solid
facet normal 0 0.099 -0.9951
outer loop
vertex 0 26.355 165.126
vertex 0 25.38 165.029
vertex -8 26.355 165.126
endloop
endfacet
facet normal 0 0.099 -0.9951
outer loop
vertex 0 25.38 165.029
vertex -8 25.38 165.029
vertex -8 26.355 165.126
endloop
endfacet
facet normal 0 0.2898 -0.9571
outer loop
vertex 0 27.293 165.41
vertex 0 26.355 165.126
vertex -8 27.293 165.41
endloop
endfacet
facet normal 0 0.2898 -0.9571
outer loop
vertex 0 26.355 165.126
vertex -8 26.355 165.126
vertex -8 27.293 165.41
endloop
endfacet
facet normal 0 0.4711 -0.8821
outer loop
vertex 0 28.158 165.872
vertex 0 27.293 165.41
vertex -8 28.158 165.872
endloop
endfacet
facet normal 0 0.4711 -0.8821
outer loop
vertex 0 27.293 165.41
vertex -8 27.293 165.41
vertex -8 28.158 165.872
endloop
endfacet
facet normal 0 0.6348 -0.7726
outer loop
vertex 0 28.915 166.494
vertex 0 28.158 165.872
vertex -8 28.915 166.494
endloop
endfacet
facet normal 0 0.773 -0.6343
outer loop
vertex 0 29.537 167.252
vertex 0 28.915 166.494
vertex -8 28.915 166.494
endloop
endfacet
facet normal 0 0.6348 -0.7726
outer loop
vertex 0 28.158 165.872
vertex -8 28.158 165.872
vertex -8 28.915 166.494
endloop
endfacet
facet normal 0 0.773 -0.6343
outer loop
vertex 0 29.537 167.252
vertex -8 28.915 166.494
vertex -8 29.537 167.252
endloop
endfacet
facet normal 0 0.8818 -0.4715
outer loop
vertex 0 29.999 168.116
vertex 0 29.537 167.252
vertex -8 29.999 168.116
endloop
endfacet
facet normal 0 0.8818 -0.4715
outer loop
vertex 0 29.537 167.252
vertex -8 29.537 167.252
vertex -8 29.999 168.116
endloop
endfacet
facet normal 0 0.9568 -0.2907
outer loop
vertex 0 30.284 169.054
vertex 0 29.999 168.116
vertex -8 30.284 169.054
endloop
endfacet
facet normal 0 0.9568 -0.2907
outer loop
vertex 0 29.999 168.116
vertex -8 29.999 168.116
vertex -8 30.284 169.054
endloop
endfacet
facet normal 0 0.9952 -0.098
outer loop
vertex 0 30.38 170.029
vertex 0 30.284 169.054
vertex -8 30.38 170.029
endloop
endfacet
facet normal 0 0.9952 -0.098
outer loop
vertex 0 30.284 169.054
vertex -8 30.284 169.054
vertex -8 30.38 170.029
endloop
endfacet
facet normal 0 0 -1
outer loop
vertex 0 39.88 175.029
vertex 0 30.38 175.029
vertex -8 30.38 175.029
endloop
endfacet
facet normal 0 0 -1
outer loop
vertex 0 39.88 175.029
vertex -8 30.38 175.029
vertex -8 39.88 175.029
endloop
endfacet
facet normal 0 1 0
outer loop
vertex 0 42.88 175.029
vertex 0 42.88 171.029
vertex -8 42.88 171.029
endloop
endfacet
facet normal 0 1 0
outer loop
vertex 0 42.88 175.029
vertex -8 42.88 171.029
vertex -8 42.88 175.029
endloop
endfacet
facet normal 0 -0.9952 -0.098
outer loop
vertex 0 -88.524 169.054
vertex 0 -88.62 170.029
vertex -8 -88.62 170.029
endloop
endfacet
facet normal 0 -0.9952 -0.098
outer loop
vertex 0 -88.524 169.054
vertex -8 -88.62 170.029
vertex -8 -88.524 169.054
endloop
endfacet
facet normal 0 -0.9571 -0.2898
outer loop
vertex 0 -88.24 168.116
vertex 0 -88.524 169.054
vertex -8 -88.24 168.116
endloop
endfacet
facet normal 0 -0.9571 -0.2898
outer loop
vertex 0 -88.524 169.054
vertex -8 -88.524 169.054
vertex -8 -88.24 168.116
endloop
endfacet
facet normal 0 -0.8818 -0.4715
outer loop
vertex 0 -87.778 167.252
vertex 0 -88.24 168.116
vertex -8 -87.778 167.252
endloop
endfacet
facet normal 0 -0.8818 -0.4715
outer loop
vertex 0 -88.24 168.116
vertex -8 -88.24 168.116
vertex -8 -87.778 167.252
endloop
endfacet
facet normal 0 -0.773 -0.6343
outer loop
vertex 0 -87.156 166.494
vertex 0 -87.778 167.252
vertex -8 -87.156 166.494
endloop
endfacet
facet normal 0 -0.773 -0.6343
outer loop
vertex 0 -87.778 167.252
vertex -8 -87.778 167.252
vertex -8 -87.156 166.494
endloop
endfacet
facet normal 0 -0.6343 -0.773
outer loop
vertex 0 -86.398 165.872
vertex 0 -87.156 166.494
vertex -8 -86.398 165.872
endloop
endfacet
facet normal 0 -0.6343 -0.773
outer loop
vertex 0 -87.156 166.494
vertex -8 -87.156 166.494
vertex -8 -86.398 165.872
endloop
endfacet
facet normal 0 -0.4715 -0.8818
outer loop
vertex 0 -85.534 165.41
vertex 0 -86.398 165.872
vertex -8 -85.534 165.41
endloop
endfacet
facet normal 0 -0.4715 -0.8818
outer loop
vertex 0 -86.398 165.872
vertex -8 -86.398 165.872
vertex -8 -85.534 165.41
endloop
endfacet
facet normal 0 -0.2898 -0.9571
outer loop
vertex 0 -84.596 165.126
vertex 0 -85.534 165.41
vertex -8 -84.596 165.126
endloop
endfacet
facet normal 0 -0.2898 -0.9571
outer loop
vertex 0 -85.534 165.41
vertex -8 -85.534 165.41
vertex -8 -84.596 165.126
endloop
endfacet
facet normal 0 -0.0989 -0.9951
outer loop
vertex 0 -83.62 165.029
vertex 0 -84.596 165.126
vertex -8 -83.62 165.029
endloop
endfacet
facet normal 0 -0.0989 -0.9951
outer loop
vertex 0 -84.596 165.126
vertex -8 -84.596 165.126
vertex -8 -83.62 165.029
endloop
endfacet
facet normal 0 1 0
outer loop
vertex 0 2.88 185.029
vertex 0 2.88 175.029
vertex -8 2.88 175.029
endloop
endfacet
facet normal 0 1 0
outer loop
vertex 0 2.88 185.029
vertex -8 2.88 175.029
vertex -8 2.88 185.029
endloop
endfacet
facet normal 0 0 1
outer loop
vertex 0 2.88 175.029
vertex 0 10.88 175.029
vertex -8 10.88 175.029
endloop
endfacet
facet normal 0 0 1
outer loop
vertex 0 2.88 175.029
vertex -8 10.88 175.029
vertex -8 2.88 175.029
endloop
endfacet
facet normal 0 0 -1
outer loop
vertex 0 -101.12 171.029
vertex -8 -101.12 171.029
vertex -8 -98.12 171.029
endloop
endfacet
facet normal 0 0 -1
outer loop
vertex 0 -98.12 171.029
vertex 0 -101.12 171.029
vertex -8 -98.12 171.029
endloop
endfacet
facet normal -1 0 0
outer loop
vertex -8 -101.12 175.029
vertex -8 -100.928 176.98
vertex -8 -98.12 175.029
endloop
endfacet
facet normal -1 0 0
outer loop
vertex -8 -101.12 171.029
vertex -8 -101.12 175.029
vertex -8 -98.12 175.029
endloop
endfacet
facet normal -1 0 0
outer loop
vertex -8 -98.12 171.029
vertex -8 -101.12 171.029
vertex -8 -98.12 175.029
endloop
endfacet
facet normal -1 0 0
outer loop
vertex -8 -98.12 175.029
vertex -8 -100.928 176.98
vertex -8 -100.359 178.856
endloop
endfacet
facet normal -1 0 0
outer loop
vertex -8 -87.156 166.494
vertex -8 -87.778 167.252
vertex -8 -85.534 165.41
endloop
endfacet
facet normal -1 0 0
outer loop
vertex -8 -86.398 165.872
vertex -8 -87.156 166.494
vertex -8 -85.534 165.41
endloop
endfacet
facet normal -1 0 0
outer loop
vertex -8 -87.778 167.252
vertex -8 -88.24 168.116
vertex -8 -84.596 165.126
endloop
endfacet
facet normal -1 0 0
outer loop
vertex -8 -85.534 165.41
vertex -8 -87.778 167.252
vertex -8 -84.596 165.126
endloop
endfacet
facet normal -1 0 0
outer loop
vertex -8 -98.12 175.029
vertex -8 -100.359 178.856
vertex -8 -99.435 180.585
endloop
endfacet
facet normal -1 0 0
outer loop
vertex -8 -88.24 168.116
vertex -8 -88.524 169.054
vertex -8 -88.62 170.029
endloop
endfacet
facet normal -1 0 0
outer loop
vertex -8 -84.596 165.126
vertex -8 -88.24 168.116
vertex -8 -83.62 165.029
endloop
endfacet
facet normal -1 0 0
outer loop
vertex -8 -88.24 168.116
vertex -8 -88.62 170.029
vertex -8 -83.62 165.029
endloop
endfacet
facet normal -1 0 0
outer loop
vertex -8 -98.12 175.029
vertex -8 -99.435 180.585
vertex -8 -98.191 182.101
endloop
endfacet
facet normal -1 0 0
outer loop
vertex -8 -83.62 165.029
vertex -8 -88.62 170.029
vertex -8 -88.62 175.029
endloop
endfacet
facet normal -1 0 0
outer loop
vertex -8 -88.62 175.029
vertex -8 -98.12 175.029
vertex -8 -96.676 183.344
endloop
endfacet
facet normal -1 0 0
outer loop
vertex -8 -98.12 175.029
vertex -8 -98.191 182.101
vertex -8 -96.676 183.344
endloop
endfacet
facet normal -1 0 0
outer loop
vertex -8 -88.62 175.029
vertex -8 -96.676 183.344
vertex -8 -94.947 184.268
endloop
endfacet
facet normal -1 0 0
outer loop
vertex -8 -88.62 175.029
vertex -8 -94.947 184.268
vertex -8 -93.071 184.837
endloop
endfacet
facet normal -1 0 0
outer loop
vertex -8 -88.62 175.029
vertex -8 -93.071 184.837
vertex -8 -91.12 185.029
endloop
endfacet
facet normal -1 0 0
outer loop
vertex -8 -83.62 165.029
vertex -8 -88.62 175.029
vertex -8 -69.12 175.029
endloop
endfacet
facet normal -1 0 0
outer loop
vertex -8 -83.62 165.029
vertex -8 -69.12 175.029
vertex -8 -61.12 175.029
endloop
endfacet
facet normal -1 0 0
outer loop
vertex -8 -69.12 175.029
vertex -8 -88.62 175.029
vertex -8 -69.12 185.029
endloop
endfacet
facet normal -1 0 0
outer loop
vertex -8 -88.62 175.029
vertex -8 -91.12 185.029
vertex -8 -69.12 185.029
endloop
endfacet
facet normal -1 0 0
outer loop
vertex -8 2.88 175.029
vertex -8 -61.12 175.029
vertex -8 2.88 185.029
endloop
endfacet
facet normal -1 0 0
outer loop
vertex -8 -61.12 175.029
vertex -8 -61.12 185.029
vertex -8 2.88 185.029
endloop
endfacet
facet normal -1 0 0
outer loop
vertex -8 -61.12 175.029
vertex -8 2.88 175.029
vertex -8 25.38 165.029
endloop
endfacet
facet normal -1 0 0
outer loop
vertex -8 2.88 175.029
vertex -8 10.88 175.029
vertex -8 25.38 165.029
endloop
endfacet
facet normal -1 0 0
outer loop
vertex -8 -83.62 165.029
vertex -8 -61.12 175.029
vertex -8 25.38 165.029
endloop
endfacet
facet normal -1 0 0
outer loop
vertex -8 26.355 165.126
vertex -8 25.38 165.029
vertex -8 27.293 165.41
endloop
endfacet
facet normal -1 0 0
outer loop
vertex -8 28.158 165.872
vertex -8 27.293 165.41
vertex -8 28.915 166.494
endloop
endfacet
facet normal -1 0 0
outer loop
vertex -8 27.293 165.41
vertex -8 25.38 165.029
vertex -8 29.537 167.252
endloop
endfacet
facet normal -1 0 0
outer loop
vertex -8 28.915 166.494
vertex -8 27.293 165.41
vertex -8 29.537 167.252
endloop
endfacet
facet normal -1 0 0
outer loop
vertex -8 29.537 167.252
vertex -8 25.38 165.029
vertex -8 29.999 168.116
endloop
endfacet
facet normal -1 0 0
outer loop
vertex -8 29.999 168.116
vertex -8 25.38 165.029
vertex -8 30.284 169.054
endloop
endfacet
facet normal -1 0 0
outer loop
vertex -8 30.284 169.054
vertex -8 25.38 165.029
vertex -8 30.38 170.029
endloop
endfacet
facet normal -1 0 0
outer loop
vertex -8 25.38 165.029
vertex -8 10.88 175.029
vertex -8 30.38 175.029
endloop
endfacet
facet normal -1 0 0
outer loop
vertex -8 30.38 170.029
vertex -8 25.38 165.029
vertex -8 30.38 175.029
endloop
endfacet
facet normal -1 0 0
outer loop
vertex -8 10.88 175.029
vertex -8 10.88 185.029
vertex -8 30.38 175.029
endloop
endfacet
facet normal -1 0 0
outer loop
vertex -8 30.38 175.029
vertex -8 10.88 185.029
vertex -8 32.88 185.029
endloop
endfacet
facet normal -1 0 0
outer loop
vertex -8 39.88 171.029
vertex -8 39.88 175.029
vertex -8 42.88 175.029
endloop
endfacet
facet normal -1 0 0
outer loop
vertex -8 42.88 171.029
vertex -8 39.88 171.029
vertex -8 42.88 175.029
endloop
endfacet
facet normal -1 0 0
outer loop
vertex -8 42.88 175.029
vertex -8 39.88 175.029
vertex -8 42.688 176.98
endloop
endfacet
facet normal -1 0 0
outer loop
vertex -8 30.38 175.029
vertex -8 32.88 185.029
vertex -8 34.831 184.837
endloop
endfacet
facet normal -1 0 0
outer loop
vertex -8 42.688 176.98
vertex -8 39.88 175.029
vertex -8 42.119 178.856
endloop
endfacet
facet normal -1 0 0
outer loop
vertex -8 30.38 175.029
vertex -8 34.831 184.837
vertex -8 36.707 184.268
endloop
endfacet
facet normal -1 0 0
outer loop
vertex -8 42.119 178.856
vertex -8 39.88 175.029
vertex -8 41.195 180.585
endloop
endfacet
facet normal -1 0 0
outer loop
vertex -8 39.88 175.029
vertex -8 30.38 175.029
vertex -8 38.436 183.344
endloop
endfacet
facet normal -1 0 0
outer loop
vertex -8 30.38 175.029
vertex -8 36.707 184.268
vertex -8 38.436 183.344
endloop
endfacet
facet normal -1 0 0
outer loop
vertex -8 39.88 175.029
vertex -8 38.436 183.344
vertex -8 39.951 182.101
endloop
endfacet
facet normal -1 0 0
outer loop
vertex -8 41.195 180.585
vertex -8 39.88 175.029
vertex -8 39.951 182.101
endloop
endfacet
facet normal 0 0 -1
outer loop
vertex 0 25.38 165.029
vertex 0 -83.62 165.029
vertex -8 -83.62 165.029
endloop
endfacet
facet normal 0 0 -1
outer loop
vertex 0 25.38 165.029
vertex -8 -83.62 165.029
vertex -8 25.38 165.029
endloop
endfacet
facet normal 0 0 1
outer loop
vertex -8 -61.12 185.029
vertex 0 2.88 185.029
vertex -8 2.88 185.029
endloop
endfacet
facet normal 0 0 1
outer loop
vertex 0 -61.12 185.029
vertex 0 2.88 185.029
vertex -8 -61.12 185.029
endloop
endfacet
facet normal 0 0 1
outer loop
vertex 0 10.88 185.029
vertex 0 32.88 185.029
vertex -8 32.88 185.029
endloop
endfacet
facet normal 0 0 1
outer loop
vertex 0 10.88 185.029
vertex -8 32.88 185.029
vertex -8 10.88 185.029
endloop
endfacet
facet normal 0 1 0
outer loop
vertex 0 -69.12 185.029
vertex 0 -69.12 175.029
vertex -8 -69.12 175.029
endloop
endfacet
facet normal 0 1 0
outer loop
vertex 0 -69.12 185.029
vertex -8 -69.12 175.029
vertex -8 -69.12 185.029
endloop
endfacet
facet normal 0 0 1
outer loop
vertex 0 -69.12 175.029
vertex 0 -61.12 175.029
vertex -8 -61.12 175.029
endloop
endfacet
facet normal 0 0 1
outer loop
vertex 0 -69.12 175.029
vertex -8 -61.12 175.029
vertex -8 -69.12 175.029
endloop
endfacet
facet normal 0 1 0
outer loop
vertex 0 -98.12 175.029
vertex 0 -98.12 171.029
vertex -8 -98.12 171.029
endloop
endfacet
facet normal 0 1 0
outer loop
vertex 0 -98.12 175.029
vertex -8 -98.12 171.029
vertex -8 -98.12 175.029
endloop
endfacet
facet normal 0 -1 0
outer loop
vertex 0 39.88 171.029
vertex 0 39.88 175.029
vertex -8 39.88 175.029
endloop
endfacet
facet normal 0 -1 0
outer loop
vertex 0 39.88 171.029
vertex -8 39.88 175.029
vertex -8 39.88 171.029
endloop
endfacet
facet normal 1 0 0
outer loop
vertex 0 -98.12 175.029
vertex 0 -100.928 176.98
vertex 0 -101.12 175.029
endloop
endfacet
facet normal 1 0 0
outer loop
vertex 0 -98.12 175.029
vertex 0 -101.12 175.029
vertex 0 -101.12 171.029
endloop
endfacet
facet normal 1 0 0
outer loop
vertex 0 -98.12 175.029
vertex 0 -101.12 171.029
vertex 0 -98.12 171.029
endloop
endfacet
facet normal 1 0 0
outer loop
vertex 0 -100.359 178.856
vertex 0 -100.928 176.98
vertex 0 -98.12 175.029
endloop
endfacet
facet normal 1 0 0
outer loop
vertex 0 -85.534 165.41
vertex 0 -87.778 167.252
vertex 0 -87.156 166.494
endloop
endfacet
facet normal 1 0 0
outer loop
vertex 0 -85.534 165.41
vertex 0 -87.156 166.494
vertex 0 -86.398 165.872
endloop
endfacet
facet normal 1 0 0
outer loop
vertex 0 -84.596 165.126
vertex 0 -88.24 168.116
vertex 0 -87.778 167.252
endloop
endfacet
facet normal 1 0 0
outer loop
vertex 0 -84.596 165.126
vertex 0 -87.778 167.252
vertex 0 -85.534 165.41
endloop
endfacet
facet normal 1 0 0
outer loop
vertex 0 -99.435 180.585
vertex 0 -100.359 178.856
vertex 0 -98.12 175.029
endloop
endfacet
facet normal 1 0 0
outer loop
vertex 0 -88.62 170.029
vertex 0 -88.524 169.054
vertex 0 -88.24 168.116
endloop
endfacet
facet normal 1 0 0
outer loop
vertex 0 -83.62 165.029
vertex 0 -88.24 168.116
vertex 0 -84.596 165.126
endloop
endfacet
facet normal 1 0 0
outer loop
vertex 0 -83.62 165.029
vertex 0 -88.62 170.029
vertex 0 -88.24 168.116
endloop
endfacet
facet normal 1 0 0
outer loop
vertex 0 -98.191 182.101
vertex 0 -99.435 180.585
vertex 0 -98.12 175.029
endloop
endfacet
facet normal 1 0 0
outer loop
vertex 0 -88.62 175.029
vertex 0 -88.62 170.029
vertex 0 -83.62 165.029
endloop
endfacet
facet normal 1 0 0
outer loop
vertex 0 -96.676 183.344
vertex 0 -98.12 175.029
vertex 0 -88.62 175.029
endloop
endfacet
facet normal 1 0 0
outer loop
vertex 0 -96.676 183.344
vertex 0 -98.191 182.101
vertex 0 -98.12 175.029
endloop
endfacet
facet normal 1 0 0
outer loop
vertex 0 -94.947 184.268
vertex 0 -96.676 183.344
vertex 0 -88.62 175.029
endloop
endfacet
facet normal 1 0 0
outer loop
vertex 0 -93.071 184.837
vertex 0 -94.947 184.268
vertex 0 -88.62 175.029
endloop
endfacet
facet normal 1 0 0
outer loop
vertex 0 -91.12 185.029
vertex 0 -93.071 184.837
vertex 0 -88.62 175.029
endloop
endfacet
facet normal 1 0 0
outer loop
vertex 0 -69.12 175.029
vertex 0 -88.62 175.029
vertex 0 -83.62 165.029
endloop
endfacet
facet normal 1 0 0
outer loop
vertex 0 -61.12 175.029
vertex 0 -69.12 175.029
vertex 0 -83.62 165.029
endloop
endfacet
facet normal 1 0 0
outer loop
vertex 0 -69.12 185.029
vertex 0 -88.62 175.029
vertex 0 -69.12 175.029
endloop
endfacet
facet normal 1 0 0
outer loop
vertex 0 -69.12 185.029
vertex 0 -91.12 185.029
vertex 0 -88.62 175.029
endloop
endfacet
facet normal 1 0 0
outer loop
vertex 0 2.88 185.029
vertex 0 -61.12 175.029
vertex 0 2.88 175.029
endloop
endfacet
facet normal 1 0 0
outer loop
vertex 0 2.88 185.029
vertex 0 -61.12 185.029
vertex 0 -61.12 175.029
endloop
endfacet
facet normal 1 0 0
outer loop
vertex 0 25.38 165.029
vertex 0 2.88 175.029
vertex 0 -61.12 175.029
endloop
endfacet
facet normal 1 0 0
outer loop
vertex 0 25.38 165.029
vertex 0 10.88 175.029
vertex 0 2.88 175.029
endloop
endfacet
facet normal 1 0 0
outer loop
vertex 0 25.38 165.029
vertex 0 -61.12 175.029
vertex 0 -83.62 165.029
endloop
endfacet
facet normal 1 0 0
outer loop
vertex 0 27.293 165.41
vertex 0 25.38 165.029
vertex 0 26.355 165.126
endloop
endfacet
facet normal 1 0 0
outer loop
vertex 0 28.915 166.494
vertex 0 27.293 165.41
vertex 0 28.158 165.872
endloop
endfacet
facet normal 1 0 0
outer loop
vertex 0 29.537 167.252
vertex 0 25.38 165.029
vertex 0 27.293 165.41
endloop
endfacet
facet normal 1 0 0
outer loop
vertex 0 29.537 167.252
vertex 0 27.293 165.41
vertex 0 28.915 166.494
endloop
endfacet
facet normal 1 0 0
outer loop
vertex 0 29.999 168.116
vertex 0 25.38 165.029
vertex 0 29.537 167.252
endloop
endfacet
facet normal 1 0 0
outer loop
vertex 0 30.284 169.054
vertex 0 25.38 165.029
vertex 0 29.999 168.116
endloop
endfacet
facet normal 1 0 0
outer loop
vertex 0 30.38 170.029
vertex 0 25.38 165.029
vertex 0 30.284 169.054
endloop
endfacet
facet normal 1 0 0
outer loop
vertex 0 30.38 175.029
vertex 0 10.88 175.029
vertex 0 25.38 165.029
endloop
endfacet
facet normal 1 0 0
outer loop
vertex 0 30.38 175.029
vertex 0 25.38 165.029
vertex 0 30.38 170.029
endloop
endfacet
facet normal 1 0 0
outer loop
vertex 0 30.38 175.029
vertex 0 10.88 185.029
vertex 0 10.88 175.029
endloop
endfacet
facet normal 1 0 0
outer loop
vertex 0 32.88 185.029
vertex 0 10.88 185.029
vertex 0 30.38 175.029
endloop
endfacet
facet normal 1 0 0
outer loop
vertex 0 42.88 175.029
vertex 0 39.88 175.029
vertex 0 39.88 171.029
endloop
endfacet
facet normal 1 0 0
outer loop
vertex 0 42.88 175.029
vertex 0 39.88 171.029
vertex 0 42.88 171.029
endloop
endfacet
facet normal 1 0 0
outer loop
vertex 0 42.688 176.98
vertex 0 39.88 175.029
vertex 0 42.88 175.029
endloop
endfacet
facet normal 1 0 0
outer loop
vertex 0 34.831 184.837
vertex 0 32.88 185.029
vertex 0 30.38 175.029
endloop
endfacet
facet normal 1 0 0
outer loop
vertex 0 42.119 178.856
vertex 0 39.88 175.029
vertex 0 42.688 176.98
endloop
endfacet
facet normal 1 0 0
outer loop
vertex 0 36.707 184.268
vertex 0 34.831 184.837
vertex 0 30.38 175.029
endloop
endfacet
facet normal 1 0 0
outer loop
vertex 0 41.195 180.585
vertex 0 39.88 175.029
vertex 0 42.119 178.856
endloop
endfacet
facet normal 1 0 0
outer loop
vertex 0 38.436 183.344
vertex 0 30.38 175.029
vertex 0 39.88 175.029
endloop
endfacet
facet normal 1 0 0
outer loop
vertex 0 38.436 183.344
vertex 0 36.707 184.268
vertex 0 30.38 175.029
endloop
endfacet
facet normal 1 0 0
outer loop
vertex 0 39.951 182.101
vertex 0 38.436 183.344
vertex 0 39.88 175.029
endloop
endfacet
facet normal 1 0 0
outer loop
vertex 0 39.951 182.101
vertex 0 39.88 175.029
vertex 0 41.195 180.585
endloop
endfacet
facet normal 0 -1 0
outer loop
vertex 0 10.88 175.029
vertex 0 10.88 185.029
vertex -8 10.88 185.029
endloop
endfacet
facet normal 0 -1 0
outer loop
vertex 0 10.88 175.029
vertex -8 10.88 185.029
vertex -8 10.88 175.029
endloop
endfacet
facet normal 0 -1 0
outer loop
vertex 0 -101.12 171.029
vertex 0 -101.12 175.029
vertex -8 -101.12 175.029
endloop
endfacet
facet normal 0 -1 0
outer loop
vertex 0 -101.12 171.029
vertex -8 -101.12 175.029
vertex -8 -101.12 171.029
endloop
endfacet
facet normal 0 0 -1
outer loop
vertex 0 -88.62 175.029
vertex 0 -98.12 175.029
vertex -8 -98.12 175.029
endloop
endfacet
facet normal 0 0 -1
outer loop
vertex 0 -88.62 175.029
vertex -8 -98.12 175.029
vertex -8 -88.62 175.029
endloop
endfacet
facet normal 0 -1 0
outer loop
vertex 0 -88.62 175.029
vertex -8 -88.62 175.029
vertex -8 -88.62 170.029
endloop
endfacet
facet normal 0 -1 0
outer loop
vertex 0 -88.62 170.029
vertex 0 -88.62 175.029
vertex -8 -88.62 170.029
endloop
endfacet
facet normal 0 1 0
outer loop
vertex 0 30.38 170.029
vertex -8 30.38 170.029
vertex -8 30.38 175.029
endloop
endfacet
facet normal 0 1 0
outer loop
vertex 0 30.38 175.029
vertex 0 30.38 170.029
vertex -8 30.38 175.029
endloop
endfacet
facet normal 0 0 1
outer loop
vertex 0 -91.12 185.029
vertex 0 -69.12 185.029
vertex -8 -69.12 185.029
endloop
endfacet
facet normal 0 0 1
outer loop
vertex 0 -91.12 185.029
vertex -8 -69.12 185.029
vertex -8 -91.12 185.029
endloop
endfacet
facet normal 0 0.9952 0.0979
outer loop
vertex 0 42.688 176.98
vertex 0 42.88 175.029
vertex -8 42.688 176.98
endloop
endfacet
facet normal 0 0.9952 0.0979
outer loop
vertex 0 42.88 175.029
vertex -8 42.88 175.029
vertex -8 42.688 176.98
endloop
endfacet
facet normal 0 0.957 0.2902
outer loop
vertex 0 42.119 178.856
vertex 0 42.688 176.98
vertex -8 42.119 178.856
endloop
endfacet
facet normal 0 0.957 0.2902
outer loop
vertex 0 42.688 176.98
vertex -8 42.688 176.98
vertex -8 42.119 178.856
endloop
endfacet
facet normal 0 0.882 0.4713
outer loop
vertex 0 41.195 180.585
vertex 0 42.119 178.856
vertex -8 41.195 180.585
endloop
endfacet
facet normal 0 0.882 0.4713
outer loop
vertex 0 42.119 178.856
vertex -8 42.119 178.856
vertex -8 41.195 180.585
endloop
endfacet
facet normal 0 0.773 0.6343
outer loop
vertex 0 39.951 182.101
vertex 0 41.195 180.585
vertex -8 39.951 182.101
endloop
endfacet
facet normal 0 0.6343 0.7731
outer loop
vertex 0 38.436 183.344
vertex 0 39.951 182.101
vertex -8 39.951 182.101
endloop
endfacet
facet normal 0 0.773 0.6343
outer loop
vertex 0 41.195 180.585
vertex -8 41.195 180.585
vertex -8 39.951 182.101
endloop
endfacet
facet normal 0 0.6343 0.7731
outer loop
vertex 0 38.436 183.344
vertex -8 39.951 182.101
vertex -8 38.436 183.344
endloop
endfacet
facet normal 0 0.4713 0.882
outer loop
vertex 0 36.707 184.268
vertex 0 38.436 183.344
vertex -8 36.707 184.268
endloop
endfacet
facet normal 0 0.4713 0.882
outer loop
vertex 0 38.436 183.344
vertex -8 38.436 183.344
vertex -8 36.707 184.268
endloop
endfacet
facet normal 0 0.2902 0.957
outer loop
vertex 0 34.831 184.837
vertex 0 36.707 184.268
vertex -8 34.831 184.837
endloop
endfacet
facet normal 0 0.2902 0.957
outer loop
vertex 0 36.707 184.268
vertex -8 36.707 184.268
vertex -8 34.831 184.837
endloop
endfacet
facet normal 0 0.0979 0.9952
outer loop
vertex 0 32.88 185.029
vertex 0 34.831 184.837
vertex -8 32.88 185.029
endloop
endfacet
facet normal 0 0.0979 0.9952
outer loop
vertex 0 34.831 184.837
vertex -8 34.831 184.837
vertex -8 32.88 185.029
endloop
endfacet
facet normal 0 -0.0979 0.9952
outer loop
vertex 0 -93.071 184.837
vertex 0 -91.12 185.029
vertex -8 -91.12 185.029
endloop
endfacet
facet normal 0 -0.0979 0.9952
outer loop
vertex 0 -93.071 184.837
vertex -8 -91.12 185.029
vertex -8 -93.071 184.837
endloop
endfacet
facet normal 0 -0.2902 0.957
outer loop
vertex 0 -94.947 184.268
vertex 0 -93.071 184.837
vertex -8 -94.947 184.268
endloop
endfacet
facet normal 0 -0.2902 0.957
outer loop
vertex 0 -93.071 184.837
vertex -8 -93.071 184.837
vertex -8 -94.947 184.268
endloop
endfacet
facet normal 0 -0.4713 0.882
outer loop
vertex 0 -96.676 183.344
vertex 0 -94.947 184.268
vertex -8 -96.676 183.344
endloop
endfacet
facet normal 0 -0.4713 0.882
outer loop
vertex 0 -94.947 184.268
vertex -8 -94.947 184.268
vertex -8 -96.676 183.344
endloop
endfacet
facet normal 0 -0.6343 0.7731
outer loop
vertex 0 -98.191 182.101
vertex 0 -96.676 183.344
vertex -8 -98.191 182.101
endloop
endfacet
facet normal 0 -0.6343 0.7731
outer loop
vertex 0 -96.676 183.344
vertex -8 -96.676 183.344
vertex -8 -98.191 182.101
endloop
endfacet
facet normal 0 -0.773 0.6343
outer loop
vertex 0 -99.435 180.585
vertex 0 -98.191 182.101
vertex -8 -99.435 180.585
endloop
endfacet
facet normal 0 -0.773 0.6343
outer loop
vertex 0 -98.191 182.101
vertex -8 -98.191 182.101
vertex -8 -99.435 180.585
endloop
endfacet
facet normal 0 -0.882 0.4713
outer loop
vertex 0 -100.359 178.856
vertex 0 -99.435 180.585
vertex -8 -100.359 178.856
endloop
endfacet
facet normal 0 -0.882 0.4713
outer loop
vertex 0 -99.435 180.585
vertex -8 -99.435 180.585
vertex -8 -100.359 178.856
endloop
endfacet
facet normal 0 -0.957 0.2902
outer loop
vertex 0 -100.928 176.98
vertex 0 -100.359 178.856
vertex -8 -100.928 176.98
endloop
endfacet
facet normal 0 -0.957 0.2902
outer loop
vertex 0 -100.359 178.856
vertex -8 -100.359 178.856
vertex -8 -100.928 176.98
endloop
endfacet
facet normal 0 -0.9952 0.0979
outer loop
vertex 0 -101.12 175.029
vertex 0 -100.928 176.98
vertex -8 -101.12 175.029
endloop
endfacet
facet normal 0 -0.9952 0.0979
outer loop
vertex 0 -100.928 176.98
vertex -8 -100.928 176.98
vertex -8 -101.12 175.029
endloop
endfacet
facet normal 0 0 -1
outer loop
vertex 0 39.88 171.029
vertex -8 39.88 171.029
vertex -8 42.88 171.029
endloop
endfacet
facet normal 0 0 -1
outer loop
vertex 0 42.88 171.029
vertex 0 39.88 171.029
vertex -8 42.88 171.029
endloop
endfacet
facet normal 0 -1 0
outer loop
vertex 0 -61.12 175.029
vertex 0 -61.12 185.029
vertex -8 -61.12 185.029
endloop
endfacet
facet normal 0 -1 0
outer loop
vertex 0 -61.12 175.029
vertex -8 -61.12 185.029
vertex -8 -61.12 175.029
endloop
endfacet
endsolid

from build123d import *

# Parameters (mm, degrees)
F1_DEPTH = 8
F2_R     = 10
F3_R     = 5


with BuildPart() as f1:
    # F0 (on Right) → F1 (new body)
    with BuildSketch(Plane.YZ):
        Polygon((-69.120196, 185.029493), (-101.120196, 185.029493), (-101.120196, 171.029493), (-98.120196, 171.029493), (-98.120196, 175.029493), (-88.620196, 175.029493), (-88.620196, 165.029493), (30.379804, 165.029493), (30.379804, 175.029493), (39.879804, 175.029493), (39.879804, 171.029493), (42.879804, 171.029493), (42.879804, 185.029493), (10.879804, 185.029493), (10.879804, 175.029493), (2.879804, 175.029493), (2.879804, 185.029493), (-61.120196, 185.029493), (-61.120196, 175.029493), (-69.120196, 175.029493), align=None)
    extrude(amount=-F1_DEPTH)

    # F2
    f2_edges = [f1.edges().sort_by_distance(p)[0] for p in [
        (-4, -101.120196, 185.029493),
        (-4, 42.879804, 185.029493),
    ]]
    fillet(f2_edges, radius=F2_R)

    # F3
    f3_edges = [f1.edges().sort_by_distance(p)[0] for p in [
        (-4, -88.620196, 165.029493),
        (-4, 30.379804, 165.029493),
    ]]
    fillet(f3_edges, radius=F3_R)


solid = f1.part
